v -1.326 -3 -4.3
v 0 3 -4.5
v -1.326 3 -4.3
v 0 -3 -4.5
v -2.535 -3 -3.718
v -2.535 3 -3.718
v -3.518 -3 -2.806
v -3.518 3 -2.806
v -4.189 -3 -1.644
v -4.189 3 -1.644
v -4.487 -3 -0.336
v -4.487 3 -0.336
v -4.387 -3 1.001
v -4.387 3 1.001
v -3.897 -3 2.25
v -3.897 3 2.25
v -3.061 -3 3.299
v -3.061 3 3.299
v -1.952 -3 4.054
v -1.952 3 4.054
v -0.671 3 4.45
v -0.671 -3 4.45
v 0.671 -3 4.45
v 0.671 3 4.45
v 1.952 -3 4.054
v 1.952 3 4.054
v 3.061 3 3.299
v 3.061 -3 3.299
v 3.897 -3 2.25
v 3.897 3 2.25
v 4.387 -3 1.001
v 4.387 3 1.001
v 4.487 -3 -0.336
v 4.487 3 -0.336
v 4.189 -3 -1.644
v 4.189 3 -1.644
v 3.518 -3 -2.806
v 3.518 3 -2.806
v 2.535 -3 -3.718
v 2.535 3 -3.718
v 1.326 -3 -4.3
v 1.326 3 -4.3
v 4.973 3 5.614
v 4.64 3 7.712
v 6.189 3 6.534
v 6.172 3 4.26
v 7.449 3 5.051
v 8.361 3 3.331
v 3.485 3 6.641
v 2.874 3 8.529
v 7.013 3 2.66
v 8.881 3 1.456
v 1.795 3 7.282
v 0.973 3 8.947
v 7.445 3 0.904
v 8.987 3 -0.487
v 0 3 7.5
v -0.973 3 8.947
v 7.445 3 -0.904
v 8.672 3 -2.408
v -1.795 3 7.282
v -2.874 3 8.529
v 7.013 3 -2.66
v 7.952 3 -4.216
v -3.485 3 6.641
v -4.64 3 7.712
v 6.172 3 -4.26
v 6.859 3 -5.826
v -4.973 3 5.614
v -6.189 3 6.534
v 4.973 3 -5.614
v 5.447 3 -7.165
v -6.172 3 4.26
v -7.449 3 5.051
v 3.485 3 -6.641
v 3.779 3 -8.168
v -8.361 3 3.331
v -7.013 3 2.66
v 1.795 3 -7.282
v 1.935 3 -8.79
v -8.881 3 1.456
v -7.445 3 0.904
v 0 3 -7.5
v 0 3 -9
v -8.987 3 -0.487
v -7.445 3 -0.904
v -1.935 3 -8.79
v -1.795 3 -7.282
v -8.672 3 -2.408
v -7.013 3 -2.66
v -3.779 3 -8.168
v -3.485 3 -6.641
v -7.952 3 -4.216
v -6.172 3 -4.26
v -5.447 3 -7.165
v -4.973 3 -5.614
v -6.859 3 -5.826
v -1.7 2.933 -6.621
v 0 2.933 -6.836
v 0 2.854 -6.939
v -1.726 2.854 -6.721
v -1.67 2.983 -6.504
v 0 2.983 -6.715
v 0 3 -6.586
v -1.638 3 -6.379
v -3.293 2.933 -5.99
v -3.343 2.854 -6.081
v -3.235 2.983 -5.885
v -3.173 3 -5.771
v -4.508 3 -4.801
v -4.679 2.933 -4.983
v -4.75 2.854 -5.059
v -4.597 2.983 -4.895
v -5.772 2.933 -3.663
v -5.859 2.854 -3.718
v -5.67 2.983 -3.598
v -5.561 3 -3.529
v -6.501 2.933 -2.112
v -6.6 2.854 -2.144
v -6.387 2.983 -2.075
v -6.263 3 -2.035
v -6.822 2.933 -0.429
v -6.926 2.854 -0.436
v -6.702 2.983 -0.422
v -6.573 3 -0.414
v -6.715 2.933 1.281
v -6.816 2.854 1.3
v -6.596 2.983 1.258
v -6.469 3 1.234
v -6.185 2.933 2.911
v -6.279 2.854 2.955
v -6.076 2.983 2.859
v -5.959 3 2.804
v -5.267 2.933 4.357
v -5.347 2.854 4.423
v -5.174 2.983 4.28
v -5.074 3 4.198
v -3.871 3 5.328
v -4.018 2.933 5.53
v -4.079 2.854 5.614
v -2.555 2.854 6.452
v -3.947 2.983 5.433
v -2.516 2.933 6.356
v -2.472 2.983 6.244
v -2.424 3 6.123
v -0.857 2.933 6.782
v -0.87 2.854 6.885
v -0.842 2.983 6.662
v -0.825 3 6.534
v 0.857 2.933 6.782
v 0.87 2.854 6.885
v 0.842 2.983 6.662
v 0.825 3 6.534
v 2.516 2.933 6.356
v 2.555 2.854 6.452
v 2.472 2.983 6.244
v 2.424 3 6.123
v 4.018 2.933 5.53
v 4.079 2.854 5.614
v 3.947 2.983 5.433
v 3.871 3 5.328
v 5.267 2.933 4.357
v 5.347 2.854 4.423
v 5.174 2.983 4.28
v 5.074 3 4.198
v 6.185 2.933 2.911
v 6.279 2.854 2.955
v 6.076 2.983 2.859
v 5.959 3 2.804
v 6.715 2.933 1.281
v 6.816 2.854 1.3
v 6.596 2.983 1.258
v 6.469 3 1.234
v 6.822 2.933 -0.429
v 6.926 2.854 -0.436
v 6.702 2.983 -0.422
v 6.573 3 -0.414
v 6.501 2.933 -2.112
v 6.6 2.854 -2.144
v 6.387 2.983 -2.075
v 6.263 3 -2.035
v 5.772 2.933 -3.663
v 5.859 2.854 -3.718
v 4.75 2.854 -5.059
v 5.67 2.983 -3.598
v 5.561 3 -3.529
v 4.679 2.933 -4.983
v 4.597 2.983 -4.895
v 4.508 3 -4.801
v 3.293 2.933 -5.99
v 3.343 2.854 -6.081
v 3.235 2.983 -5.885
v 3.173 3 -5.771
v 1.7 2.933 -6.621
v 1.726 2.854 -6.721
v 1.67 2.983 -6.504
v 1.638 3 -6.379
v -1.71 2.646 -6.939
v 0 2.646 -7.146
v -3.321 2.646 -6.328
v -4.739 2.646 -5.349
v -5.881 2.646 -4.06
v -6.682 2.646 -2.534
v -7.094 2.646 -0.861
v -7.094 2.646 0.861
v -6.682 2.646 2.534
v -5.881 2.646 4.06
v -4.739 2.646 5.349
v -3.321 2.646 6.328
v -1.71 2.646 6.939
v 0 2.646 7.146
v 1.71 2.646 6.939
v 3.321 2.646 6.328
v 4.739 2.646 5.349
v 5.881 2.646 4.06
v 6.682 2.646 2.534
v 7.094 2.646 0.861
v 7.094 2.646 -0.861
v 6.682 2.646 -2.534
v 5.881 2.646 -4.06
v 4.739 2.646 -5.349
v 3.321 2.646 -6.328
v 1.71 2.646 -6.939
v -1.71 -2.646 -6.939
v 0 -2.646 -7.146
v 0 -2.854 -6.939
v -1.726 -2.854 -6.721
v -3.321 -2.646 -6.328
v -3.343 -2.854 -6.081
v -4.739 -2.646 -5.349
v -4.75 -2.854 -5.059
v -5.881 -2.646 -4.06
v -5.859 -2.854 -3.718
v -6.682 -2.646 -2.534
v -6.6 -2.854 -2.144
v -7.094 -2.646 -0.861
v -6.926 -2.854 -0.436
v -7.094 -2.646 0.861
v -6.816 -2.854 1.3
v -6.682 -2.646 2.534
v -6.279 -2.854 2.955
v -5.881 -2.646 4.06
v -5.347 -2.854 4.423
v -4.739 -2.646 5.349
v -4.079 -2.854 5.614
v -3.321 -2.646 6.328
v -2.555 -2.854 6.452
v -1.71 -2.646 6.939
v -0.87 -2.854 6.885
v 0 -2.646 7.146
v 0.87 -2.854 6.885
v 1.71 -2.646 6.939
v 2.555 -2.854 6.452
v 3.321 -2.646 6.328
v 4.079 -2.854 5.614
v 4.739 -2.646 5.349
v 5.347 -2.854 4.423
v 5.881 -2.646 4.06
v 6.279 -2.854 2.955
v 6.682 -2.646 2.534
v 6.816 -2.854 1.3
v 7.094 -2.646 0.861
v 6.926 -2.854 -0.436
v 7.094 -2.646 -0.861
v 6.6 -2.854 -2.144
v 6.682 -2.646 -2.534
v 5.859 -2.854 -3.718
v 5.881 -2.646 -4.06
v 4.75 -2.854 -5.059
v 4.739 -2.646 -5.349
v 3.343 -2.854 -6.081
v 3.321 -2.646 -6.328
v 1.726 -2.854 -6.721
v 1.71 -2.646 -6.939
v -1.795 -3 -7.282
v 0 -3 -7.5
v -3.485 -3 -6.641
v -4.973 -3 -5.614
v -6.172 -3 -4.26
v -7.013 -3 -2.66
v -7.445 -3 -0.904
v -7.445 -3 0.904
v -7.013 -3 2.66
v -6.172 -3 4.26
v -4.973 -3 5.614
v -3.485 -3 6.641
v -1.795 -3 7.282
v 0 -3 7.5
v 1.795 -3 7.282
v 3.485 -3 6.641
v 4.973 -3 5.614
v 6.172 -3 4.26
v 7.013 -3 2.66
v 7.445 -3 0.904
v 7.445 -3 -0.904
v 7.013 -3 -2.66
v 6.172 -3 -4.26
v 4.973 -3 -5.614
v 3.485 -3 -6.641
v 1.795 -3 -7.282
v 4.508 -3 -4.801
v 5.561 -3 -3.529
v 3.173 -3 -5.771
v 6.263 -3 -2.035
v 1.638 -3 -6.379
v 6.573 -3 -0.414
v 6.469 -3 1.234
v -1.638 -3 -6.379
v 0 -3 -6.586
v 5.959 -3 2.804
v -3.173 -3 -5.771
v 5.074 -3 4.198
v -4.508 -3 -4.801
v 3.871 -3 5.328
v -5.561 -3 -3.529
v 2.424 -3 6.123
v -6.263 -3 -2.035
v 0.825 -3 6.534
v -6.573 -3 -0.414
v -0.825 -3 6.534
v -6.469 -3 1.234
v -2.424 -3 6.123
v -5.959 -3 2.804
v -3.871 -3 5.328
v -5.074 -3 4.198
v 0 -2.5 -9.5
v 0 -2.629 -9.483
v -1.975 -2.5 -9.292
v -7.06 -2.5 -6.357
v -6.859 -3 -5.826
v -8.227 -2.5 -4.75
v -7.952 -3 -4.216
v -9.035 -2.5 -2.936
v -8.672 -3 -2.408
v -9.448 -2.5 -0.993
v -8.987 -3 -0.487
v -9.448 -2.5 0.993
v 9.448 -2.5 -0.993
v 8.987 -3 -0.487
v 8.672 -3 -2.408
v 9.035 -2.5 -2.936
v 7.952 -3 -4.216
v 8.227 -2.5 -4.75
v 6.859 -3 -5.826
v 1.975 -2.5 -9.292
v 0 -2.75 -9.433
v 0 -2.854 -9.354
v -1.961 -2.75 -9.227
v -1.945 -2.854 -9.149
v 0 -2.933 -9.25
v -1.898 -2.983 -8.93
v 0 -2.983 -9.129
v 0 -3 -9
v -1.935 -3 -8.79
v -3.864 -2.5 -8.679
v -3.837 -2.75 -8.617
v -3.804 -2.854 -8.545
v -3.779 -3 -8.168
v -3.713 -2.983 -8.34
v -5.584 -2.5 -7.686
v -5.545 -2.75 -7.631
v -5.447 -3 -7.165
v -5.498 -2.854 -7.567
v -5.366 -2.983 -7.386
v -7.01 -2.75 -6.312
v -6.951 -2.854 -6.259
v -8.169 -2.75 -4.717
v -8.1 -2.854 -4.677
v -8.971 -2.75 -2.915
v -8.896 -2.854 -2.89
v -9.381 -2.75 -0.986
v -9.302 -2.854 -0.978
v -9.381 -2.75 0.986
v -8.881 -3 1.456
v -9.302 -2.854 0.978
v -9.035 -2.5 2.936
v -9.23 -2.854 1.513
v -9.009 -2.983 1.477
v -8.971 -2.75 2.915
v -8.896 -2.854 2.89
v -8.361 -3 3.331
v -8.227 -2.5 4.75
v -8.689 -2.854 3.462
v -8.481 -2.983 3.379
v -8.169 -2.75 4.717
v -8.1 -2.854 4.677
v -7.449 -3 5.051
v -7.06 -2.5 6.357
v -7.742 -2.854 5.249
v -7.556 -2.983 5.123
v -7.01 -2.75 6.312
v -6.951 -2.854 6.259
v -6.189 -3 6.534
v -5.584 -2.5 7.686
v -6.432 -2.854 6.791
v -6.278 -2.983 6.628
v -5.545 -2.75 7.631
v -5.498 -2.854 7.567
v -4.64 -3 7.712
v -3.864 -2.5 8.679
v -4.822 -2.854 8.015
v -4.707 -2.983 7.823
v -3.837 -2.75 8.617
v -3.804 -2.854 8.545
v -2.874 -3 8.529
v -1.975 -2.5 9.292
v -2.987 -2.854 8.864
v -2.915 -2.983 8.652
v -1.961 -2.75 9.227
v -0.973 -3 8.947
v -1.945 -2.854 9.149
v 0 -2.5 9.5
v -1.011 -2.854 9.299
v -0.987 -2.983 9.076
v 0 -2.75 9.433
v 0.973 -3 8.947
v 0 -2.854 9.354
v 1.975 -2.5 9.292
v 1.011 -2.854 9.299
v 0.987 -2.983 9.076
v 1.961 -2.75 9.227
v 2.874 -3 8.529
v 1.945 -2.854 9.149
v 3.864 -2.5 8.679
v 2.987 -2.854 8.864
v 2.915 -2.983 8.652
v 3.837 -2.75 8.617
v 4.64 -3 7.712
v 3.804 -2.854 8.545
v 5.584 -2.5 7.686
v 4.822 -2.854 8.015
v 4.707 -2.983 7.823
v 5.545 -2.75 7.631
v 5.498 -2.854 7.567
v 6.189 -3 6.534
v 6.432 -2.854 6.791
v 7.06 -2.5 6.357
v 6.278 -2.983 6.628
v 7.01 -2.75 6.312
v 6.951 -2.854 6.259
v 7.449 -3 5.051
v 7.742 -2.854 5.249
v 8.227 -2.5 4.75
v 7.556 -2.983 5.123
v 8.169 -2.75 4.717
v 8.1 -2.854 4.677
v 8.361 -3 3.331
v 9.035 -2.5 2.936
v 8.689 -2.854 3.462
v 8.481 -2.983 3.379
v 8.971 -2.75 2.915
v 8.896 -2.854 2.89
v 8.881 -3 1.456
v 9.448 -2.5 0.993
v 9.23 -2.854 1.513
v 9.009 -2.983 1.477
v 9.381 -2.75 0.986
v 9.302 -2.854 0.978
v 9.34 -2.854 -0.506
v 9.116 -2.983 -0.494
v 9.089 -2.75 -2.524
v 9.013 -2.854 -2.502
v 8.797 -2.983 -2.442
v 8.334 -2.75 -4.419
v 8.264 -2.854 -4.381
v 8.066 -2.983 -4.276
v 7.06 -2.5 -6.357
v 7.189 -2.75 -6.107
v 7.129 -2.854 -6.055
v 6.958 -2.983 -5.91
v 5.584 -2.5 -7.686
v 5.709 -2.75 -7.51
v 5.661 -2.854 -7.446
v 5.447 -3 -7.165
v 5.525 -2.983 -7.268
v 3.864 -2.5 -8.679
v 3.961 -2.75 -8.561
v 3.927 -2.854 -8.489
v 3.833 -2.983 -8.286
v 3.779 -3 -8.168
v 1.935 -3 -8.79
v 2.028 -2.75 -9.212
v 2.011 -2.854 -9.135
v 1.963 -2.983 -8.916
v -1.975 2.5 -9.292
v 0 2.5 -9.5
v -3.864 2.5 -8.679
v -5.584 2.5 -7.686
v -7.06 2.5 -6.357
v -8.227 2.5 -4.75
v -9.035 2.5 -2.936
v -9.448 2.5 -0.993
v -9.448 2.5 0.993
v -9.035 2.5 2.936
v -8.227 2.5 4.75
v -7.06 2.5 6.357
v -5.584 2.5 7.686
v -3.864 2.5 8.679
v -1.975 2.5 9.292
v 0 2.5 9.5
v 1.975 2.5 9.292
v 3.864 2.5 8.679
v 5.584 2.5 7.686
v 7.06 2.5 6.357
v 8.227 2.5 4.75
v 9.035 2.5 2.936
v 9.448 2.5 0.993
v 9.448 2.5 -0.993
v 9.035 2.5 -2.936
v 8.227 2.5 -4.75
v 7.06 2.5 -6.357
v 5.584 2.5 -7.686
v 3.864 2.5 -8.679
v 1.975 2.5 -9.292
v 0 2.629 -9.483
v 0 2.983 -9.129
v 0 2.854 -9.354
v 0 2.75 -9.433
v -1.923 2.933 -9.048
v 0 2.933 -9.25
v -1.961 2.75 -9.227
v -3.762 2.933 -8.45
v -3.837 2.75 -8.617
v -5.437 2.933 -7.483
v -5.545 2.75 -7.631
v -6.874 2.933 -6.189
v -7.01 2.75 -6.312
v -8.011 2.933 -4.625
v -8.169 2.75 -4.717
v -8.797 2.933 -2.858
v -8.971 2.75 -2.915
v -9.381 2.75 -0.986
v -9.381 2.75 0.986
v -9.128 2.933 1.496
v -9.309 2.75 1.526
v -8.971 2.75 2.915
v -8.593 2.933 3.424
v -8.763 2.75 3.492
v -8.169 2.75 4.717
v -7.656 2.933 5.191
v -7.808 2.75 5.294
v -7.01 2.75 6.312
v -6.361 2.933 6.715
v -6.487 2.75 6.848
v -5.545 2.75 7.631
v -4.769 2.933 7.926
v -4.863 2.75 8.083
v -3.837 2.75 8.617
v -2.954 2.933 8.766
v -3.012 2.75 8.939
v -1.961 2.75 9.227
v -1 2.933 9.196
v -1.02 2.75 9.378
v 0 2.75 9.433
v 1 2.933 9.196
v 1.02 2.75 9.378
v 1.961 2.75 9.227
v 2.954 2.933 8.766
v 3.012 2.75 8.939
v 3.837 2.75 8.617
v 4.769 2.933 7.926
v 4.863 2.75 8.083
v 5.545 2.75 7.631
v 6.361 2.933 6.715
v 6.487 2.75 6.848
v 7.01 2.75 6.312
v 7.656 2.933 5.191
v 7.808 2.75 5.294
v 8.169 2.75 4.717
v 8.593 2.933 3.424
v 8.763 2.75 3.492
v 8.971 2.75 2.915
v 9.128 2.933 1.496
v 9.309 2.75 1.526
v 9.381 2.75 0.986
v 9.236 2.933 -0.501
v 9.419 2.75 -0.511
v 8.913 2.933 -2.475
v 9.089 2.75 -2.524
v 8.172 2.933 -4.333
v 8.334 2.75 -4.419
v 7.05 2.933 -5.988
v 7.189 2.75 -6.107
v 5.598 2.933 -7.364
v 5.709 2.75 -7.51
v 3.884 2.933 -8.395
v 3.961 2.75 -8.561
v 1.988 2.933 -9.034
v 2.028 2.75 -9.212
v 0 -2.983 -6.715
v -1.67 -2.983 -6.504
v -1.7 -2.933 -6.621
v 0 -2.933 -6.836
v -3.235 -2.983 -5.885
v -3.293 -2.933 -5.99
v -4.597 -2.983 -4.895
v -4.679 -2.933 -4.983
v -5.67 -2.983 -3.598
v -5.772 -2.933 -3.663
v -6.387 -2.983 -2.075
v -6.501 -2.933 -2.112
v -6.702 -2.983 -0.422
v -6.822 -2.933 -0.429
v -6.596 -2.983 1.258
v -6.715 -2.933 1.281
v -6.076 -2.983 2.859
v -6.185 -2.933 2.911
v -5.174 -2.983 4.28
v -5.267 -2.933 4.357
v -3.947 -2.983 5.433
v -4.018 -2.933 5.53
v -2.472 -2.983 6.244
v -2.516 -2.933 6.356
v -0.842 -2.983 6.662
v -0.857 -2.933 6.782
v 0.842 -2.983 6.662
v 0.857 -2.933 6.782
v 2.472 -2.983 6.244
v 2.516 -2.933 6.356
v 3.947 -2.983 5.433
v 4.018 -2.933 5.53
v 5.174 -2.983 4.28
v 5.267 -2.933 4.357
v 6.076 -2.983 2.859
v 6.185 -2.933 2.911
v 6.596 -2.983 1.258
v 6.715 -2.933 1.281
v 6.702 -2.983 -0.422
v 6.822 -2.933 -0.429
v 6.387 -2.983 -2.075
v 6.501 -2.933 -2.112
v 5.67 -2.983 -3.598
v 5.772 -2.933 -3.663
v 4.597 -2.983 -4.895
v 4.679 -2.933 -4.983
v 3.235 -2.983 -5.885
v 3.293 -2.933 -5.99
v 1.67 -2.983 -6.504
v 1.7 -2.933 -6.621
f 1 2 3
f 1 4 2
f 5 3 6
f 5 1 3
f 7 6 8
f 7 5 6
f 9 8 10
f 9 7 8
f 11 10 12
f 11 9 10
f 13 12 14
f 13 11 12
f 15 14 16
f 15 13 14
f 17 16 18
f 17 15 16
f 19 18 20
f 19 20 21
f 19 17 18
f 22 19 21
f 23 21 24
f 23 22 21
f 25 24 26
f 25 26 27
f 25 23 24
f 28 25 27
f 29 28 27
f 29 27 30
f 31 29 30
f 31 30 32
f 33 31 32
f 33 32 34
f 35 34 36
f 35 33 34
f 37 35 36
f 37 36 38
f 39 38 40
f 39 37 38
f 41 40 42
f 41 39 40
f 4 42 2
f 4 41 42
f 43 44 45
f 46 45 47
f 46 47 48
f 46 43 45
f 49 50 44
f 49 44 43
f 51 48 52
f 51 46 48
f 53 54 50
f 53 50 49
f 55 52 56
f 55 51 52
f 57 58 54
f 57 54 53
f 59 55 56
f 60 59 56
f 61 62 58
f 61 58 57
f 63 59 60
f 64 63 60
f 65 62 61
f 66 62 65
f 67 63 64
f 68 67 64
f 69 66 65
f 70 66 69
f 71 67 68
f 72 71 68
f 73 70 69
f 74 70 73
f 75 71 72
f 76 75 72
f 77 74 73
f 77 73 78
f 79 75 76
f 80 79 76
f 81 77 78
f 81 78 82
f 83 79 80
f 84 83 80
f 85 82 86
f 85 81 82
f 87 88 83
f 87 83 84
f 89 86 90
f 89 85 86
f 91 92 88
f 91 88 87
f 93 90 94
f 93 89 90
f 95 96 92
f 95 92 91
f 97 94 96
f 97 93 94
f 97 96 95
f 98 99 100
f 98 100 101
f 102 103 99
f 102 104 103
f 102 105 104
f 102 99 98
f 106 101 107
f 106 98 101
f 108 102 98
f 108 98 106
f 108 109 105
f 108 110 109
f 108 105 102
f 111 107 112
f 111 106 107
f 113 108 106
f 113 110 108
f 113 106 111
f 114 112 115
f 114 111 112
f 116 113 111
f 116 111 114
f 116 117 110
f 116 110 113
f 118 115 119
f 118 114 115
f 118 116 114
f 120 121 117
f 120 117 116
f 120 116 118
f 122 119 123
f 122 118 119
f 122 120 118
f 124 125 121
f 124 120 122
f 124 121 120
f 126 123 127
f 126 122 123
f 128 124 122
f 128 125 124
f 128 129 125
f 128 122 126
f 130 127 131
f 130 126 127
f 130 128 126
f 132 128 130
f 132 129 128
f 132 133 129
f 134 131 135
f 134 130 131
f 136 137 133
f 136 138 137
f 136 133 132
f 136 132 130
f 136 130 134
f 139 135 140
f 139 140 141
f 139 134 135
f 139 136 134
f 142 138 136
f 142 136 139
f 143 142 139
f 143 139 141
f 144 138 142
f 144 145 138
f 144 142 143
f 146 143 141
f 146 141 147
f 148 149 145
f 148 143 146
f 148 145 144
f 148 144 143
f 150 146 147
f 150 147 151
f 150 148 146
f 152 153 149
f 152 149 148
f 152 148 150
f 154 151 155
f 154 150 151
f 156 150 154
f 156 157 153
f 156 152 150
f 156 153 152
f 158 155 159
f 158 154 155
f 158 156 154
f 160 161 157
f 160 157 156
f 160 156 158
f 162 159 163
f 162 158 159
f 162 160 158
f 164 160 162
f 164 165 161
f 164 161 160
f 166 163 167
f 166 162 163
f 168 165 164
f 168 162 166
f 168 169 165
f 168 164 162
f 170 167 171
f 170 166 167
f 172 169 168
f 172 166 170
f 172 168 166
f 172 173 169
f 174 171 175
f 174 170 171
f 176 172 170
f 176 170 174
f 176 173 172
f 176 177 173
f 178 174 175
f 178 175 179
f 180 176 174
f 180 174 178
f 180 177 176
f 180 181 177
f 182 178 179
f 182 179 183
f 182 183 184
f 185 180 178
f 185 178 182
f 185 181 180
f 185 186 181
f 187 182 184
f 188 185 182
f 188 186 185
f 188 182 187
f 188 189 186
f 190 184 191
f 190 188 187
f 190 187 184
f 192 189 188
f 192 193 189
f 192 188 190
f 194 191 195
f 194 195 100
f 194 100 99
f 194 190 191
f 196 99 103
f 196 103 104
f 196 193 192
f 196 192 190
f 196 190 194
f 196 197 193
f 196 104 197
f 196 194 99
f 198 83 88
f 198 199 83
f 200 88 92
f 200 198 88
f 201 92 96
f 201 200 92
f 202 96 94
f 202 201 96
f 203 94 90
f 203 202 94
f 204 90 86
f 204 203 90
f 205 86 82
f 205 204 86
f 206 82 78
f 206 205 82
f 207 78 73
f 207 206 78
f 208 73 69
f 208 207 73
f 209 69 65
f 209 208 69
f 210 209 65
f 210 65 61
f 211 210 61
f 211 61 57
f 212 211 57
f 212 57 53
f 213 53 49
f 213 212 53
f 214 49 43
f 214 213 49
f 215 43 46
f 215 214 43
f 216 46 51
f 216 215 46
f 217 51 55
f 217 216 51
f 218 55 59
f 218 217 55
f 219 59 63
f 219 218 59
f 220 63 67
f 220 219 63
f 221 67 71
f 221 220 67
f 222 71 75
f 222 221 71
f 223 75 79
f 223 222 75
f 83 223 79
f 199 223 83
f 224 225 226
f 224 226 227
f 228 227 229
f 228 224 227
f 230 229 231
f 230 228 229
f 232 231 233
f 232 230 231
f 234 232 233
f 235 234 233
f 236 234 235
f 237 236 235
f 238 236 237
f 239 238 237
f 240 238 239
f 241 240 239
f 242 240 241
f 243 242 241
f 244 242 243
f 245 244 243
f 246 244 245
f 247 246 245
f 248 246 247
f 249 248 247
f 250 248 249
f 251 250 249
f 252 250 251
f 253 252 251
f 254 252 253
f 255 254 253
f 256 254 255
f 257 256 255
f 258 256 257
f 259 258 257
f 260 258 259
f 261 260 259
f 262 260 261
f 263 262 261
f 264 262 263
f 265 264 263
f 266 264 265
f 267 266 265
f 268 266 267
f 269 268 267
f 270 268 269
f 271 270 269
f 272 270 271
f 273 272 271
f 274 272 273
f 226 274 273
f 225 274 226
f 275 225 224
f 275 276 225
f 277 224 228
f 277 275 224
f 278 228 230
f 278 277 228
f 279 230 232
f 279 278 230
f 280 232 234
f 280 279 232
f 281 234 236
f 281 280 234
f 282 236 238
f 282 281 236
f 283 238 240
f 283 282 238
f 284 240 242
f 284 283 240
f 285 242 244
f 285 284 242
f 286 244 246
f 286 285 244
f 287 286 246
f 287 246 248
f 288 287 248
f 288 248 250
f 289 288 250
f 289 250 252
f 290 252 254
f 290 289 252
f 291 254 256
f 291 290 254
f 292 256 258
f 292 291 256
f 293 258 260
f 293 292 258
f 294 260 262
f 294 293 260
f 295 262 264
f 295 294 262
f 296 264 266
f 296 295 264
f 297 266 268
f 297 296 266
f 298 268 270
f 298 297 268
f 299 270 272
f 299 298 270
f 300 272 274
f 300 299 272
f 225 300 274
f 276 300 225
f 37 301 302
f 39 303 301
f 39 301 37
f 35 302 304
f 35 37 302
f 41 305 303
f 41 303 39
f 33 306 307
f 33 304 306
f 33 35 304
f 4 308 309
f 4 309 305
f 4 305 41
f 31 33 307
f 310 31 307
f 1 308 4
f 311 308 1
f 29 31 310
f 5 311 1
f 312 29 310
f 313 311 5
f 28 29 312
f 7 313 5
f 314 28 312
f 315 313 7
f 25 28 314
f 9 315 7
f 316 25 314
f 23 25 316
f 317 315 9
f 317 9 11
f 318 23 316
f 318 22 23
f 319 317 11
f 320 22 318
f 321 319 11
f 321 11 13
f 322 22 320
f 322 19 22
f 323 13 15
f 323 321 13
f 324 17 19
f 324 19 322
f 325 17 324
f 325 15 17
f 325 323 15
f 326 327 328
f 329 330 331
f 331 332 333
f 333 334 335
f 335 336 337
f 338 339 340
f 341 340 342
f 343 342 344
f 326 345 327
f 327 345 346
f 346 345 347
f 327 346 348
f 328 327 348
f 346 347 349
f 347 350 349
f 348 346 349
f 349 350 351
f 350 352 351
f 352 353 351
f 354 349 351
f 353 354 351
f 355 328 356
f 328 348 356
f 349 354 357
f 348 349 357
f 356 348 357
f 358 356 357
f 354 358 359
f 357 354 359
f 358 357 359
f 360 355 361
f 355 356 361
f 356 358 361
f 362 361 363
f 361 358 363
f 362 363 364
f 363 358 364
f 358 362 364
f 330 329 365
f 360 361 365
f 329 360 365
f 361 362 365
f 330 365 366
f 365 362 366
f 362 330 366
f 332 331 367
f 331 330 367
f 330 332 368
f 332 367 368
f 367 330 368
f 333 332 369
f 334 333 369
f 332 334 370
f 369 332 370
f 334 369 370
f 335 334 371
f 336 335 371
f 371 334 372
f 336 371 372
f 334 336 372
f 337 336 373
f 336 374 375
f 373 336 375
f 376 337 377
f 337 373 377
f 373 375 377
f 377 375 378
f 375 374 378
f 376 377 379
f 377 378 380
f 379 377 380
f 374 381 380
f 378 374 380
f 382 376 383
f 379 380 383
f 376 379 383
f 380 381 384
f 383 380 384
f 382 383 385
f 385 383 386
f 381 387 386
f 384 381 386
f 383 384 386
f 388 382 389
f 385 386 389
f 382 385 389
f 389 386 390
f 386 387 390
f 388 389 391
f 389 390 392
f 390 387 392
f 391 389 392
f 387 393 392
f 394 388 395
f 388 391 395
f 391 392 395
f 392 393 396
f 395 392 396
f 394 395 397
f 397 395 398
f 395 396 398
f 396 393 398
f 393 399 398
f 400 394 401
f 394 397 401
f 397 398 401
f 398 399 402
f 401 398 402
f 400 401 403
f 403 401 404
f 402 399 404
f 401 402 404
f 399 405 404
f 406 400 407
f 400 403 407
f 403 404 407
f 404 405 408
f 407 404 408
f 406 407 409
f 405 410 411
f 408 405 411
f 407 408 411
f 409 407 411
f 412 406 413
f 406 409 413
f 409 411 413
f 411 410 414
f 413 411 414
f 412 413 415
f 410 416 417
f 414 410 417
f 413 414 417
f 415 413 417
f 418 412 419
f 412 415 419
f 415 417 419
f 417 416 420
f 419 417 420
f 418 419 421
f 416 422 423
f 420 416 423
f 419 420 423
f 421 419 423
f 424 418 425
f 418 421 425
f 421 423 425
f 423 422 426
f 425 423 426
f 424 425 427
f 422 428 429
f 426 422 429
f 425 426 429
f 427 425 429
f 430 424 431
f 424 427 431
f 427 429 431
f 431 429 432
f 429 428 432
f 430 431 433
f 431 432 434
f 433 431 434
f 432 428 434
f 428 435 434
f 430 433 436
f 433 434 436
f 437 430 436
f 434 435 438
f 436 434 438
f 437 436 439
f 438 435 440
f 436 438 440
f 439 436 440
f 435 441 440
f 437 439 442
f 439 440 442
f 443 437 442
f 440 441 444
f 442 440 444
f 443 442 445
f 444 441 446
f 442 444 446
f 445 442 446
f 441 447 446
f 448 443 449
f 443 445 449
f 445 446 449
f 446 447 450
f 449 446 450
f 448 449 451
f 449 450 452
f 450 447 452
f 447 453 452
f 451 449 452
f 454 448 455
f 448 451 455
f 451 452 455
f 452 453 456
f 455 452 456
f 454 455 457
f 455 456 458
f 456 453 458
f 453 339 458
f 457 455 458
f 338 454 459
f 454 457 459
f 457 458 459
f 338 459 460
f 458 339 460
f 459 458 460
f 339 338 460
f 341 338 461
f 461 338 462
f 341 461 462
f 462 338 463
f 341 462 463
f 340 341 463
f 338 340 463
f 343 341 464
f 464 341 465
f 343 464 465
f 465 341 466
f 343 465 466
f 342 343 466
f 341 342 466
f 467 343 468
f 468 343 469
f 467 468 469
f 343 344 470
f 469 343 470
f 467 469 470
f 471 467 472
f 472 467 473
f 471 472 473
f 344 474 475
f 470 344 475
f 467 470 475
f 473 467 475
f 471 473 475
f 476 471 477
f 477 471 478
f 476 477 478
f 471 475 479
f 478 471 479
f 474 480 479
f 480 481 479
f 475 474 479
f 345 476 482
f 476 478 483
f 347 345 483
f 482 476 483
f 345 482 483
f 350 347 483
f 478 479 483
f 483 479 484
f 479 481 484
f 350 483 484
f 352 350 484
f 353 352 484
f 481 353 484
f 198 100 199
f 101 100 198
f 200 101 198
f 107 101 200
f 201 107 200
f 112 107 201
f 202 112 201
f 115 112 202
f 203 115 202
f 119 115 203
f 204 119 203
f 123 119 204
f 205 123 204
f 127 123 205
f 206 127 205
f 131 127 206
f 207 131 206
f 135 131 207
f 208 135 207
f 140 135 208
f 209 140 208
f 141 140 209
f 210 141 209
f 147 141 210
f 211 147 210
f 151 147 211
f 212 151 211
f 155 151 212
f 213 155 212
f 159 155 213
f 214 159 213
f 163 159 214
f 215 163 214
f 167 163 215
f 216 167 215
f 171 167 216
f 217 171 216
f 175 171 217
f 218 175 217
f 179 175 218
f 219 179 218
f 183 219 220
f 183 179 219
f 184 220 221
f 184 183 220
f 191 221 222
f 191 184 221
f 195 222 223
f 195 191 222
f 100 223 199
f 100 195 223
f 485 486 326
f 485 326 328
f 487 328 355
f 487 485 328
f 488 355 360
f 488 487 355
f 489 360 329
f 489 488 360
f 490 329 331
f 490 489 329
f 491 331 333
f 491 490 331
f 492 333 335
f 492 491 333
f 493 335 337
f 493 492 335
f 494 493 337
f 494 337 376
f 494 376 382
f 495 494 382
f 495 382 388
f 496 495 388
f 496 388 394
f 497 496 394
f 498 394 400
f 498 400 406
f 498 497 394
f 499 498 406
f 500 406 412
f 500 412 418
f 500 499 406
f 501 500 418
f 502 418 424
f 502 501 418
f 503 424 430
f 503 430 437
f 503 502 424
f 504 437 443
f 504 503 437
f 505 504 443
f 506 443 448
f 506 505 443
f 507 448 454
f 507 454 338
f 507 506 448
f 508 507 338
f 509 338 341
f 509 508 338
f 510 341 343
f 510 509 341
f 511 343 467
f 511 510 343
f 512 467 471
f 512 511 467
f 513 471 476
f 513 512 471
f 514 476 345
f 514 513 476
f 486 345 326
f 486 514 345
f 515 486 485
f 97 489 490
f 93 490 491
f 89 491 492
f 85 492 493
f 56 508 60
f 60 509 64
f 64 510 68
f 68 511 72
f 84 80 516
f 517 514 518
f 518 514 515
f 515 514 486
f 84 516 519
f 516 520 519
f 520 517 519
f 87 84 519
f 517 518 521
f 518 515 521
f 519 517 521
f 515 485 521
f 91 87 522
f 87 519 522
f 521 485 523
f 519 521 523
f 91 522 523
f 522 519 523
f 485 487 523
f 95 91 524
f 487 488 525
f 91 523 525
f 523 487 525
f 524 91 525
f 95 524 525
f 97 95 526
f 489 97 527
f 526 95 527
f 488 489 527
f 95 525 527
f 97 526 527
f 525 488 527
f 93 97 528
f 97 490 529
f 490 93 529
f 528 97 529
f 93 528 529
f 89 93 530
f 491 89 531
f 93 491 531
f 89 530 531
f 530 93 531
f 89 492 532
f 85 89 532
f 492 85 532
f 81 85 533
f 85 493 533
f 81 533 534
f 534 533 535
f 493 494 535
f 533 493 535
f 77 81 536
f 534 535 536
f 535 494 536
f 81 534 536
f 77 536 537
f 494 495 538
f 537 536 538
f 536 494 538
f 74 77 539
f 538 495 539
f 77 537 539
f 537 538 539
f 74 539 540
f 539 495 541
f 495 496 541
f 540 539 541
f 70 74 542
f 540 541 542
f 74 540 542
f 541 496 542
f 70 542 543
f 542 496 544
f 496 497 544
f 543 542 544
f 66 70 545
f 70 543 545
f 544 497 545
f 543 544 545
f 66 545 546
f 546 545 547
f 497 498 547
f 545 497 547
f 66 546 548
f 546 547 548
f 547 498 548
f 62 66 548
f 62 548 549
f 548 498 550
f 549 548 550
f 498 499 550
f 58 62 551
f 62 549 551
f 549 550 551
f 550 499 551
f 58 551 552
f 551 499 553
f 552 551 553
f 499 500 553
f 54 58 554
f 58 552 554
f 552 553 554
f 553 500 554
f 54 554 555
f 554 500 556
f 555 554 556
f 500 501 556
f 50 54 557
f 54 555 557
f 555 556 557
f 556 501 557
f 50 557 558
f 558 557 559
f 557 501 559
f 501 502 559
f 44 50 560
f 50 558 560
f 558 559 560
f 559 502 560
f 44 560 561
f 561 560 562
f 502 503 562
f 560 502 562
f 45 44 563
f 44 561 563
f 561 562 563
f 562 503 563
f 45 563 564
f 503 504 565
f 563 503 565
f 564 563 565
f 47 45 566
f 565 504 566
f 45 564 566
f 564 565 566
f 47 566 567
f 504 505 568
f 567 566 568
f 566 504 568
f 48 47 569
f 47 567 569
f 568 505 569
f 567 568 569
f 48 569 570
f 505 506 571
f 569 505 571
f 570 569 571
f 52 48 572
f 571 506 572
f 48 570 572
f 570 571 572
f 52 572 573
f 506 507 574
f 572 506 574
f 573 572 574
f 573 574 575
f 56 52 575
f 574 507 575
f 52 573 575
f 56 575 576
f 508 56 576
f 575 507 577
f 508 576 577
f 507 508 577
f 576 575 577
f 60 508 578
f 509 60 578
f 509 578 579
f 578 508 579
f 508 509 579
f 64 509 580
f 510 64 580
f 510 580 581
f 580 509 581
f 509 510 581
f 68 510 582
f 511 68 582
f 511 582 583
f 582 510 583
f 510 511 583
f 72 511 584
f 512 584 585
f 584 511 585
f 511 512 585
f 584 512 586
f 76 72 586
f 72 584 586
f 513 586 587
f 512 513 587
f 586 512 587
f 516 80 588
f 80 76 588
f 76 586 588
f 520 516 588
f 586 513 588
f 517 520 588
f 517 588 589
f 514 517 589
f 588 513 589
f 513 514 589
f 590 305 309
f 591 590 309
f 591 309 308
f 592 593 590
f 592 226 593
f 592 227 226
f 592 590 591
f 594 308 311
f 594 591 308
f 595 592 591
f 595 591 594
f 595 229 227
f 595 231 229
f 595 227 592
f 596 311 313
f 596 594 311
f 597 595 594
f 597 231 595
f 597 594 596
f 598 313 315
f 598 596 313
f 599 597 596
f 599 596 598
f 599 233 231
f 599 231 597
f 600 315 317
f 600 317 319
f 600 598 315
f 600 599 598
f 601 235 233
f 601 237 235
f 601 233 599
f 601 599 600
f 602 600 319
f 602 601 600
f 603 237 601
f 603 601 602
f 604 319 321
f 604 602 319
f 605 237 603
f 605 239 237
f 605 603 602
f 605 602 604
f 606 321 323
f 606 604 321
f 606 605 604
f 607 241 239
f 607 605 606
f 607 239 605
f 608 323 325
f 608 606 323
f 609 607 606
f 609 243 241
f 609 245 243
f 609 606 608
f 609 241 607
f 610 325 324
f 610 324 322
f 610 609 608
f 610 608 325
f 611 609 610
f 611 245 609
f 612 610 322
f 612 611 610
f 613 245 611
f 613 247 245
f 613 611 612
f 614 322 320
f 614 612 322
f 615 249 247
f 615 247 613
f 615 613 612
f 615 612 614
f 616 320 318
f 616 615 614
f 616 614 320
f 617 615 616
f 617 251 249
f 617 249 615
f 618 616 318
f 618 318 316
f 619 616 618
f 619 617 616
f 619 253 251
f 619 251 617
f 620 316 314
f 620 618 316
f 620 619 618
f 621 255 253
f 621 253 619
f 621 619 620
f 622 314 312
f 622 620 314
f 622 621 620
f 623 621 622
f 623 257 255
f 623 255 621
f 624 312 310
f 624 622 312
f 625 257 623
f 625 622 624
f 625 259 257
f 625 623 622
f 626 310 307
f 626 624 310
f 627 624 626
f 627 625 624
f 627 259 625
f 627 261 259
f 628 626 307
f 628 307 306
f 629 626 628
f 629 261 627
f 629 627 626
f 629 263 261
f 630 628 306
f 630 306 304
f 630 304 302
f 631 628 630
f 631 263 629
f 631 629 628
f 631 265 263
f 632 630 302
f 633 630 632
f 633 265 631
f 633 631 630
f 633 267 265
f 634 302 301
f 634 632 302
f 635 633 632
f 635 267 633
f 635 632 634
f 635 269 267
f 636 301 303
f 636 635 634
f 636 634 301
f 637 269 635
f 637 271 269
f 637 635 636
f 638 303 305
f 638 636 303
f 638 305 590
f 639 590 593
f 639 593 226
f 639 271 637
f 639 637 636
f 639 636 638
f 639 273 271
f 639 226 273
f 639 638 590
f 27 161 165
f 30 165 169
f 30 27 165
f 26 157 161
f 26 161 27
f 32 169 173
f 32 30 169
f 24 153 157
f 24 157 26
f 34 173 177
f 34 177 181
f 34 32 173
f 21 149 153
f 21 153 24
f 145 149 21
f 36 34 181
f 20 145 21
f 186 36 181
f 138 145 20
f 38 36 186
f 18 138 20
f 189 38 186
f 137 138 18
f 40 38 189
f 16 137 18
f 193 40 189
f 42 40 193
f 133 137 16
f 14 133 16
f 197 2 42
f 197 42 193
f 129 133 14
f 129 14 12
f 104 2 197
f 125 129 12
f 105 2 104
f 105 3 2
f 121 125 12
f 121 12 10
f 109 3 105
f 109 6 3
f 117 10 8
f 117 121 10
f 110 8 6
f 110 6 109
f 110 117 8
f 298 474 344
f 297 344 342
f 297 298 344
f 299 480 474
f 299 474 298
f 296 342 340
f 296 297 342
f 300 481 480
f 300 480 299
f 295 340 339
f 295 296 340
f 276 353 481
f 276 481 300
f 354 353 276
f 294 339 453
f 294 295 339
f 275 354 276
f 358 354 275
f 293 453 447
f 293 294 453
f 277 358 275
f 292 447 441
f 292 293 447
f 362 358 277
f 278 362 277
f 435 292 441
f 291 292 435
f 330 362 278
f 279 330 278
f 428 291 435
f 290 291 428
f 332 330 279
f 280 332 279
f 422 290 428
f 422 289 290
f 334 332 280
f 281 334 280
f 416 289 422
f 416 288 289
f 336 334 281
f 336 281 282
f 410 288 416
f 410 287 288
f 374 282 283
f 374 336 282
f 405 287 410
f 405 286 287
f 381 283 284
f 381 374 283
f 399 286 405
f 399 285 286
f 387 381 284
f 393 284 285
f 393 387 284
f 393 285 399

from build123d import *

# Parameters (mm, degrees)
CONG_2_R = 0.5
CONG_3_R = 0.5


with BuildPart() as part:
    # Esquisse1 → Révolution1 (revolve)
    with BuildSketch(Plane.XY, mode=Mode.PRIVATE) as r_volution1_sk:
        Polygon((-9.5, -3), (-9.5, 3), (-7.5, 3), (-7.146446609, 2.646446609), (-6.792893219, 3), (-4.5, 3), (-4.5, -3), (-6.792893219, -3), (-7.146446609, -2.646446609), (-7.5, -3), align=None)
    revolve(r_volution1_sk.sketch.rotate(Axis((0, 0, 0), (0, 1, 0)), 270), axis=Axis((0, 0, 0), (0, 1, 0)))

    # Congé2
    cong_2_edges = [part.edges().sort_by_distance(p)[0] for p in [
        (0, 3, 6.792893219),
        (0, -3, 6.792893219),
    ]]
    fillet(cong_2_edges, radius=CONG_2_R)

    # Congé3
    cong_3_edges = [part.edges().sort_by_distance(p)[0] for p in [
        (0, 3, 9.5),
        (0, -3, 9.5),
    ]]
    fillet(cong_3_edges, radius=CONG_3_R)


solid = part.part
